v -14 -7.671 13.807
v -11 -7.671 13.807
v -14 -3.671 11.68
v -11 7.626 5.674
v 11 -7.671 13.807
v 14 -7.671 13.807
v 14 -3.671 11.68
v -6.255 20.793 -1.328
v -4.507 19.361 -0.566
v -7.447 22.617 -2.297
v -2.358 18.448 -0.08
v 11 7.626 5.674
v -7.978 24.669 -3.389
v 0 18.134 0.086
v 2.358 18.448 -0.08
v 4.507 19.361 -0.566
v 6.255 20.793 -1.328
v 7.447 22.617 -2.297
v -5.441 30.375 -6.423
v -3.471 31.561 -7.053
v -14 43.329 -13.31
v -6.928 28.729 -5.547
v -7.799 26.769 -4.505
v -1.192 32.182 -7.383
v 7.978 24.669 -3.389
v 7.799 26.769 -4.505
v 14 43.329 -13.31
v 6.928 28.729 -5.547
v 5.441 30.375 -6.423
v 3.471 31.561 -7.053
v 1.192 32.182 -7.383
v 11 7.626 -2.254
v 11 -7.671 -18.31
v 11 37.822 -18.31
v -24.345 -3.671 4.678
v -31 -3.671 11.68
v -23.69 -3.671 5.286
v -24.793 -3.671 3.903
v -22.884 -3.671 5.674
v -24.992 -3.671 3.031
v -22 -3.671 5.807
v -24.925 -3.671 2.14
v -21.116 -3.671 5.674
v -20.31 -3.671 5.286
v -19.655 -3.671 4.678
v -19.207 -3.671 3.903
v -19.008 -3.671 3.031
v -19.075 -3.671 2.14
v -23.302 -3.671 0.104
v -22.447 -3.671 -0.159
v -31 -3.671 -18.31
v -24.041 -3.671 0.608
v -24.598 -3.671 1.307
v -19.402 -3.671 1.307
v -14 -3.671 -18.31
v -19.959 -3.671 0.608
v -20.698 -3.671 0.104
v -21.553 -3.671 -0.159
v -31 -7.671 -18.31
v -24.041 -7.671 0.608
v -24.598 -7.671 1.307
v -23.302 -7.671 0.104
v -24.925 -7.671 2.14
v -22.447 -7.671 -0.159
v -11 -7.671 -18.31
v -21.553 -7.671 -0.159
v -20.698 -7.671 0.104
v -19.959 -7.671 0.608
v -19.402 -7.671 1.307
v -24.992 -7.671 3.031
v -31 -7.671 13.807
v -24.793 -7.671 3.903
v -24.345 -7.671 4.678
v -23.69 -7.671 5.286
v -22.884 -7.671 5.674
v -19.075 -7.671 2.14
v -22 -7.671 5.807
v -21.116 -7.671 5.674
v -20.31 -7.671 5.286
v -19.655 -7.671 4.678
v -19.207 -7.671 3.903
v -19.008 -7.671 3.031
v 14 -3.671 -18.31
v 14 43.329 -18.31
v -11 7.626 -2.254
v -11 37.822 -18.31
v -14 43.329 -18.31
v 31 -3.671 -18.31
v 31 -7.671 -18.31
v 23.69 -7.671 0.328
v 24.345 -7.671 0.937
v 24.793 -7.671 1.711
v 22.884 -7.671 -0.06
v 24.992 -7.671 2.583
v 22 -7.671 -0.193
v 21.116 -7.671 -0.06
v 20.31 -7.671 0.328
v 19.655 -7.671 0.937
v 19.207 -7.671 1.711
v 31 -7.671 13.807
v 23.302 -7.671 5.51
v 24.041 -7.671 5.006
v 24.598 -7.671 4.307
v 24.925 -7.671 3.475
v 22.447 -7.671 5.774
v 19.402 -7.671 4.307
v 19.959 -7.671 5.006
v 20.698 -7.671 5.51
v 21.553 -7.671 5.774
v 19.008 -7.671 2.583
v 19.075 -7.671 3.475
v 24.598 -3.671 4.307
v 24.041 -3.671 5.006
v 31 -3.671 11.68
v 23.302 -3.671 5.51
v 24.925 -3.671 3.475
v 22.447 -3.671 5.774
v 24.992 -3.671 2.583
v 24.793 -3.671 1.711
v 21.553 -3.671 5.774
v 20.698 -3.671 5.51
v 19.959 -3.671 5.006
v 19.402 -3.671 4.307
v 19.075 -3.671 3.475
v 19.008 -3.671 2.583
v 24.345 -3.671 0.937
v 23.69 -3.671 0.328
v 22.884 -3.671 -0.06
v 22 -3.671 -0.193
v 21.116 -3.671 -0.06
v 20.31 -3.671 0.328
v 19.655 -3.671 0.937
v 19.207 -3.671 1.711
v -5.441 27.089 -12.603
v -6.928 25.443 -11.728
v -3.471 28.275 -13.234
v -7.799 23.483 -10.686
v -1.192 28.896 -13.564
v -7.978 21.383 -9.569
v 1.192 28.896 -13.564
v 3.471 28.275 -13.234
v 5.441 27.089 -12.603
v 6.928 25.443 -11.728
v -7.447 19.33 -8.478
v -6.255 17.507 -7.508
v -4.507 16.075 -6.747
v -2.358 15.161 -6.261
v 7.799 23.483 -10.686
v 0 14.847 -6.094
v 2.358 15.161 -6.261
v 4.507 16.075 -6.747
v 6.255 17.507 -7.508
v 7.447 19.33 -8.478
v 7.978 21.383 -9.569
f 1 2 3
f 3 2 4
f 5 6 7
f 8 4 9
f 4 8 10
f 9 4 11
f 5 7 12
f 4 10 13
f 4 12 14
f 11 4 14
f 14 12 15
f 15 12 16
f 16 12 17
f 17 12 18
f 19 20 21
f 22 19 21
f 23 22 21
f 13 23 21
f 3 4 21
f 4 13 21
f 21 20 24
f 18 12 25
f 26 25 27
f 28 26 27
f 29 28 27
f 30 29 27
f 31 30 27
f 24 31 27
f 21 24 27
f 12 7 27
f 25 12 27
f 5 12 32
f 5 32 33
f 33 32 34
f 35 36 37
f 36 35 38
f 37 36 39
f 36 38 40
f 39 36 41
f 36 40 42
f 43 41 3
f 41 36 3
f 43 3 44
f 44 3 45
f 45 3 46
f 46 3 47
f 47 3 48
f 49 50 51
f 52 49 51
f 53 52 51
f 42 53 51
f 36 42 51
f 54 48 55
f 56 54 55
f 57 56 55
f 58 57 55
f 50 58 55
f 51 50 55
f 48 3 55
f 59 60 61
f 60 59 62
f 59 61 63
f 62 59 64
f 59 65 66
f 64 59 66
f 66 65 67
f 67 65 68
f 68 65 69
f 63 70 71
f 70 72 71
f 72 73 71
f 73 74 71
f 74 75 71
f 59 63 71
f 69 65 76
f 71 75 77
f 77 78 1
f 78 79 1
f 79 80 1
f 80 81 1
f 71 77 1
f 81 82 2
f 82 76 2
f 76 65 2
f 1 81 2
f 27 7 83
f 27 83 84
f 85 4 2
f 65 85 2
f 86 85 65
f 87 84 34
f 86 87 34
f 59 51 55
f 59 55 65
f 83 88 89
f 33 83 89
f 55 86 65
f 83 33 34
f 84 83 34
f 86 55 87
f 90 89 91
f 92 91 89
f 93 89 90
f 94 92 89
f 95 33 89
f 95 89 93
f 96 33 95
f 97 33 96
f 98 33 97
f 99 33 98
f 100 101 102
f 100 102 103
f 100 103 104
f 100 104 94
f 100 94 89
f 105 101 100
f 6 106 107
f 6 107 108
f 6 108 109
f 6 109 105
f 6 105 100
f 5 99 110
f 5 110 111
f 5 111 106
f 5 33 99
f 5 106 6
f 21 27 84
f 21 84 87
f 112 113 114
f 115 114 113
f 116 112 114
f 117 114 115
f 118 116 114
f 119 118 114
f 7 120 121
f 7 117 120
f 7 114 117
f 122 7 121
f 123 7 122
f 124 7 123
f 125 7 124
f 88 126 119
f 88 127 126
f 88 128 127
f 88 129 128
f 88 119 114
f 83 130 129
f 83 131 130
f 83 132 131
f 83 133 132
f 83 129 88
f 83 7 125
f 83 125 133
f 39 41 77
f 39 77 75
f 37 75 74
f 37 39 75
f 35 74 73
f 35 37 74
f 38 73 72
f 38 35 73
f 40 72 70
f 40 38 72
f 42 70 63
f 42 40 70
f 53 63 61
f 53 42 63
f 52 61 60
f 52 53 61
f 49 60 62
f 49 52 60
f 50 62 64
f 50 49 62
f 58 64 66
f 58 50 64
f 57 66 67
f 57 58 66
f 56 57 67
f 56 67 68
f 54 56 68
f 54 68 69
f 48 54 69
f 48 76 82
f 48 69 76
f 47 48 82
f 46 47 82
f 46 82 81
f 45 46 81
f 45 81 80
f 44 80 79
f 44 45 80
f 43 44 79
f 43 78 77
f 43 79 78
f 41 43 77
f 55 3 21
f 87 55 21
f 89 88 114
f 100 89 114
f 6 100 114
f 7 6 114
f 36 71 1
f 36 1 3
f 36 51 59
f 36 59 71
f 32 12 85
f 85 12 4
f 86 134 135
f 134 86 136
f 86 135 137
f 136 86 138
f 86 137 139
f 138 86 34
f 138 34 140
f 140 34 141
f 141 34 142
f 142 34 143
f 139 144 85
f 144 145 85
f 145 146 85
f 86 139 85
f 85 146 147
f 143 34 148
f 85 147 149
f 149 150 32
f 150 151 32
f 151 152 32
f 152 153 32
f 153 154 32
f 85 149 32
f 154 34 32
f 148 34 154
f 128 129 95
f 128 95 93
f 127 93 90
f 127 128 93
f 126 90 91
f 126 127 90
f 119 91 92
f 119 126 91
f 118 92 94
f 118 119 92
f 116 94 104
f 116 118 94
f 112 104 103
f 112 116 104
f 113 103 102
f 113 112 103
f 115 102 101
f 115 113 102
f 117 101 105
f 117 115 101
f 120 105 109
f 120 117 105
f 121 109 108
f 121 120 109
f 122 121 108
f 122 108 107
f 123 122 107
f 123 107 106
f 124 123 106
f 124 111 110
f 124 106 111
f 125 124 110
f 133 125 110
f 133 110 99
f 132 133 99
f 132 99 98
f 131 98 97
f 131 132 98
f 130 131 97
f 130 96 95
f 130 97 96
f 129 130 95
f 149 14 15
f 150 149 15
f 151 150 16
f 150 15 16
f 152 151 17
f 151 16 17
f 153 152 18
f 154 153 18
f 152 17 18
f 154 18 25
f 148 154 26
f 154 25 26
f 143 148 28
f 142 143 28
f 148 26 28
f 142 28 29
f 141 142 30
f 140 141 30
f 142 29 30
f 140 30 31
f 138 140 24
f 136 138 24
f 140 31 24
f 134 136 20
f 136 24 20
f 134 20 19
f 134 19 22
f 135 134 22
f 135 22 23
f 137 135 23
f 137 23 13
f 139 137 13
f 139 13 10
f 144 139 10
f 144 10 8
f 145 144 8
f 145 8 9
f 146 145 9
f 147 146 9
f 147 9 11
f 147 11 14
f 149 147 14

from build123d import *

# Parameters (mm, degrees)
BOSS_EXTRUDE1_DEPTH     = 14
SKETCH4_W               = 28
SKETCH4_H               = 51
BOSS_EXTRUDE2_DEPTH     = 5
SKETCH3_R               = 8
CUT_EXTRUDE1_DEPTH      = 50.099012473
CUT_EXTRUDE3_DEPTH      = 11
CUT_EXTRUDE4_DEPTH      = 49.798206602
CUT_EXTRUDE4_DEPTH_BACK = 49.798206602
SKETCH7_W               = 22
SKETCH7_H               = 15.296617448
BOSS_EXTRUDE3_DEPTH     = 17
CUT_EXTRUDE5_DEPTH      = 63.42802941
CUT_EXTRUDE5_DEPTH_BACK = 63.42802941
SKETCH11_R              = 3


with BuildPart() as part:
    # Sketch1 → Boss-Extrude1 (new, symmetric)
    with BuildSketch(Plane(origin=(0, 0, 0), x_dir=(0, 0, -1), z_dir=(1, 0, 0))):
        Polygon((-13.807105756, -7.671099373), (13.310075259, 43.328900627), (13.310075259, -7.671099373), align=None)
    extrude(amount=BOSS_EXTRUDE1_DEPTH, both=True)

    # Sketch4 → Boss-Extrude2 (add)
    with BuildSketch(Plane(origin=(0, 0, -13.310075259), x_dir=(-1, 0, 0), z_dir=(0, 0, -1))):
        with Locations((0, 17.828900627)):
            Rectangle(SKETCH4_W, SKETCH4_H)
    extrude(amount=BOSS_EXTRUDE2_DEPTH)

    # Sketch3 → Cut-Extrude1 (cut, through all)
    with BuildSketch(Plane(origin=(0, 4.032567199, 7.584155854), x_dir=(1, 0, 0), z_dir=(0, 0.46947156278589475, 0.8829475928589249))):
        with Locations(Location((0, 23.97057959, 0), (0, 0, 270))):
            Circle(SKETCH3_R)
    extrude(amount=-CUT_EXTRUDE1_DEPTH, mode=Mode.SUBTRACT)

    # Sketch6 → Cut-Extrude3 (cut, symmetric)
    with BuildSketch(Plane(origin=(0, 0, 0), x_dir=(0, 0, -1), z_dir=(1, 0, 0))):
        Polygon((18.310075259, 37.822151676), (0.763812466, 4.822430874), (0.763812466, -14.665024569), (18.310075259, -14.665024569), (18.310075259, 4.822430874), align=None)
    extrude(amount=CUT_EXTRUDE3_DEPTH, both=True, mode=Mode.SUBTRACT)

    # Sketch7 → Cut-Extrude4 (cut, two sides: drawn at the far end of the back side and taken through both)
    with BuildSketch(Plane(origin=(0, 0, -0.763812466), x_dir=(-1, 0, 0), z_dir=(0, 0, -1)).offset(-CUT_EXTRUDE4_DEPTH_BACK)):
        with Locations((0, -0.022790649)):
            Rectangle(SKETCH7_W, SKETCH7_H)
    extrude(amount=CUT_EXTRUDE4_DEPTH + CUT_EXTRUDE4_DEPTH_BACK, mode=Mode.SUBTRACT)

    # Sketch10 → Boss-Extrude3 (add)
    with BuildSketch(Plane(origin=(14, 0, 0), x_dir=(0, 0, -1), z_dir=(1, 0, 0))):
        Polygon((-13.807105756, -7.671099373), (-11.680268029, -3.671099373), (18.310075259, -3.671099373), (18.310075259, -7.671099373), align=None)
    boss_extrude3 = extrude(amount=BOSS_EXTRUDE3_DEPTH)

    # Mirror5: Boss-Extrude3 across plane
    add(boss_extrude3.mirror(Plane(origin=(0, 0, 0), x_dir=(0, 0, 1), z_dir=(1, 0, 0))))

    # Sketch11 → Cut-Extrude5 (cut, two sides: drawn at the far end of the back side and taken through both)
    with BuildSketch(Plane.XZ.offset(7.671099373).offset(-CUT_EXTRUDE5_DEPTH_BACK)):
        with Locations(Location((22, 2.807105756, 0), (0, 0, 270))):
            Circle(SKETCH11_R)
        with Locations(Location((-22, 2.807105756, 0), (0, 0, 90))):
            Circle(SKETCH11_R)
    extrude(amount=CUT_EXTRUDE5_DEPTH + CUT_EXTRUDE5_DEPTH_BACK, mode=Mode.SUBTRACT)


solid = part.part
